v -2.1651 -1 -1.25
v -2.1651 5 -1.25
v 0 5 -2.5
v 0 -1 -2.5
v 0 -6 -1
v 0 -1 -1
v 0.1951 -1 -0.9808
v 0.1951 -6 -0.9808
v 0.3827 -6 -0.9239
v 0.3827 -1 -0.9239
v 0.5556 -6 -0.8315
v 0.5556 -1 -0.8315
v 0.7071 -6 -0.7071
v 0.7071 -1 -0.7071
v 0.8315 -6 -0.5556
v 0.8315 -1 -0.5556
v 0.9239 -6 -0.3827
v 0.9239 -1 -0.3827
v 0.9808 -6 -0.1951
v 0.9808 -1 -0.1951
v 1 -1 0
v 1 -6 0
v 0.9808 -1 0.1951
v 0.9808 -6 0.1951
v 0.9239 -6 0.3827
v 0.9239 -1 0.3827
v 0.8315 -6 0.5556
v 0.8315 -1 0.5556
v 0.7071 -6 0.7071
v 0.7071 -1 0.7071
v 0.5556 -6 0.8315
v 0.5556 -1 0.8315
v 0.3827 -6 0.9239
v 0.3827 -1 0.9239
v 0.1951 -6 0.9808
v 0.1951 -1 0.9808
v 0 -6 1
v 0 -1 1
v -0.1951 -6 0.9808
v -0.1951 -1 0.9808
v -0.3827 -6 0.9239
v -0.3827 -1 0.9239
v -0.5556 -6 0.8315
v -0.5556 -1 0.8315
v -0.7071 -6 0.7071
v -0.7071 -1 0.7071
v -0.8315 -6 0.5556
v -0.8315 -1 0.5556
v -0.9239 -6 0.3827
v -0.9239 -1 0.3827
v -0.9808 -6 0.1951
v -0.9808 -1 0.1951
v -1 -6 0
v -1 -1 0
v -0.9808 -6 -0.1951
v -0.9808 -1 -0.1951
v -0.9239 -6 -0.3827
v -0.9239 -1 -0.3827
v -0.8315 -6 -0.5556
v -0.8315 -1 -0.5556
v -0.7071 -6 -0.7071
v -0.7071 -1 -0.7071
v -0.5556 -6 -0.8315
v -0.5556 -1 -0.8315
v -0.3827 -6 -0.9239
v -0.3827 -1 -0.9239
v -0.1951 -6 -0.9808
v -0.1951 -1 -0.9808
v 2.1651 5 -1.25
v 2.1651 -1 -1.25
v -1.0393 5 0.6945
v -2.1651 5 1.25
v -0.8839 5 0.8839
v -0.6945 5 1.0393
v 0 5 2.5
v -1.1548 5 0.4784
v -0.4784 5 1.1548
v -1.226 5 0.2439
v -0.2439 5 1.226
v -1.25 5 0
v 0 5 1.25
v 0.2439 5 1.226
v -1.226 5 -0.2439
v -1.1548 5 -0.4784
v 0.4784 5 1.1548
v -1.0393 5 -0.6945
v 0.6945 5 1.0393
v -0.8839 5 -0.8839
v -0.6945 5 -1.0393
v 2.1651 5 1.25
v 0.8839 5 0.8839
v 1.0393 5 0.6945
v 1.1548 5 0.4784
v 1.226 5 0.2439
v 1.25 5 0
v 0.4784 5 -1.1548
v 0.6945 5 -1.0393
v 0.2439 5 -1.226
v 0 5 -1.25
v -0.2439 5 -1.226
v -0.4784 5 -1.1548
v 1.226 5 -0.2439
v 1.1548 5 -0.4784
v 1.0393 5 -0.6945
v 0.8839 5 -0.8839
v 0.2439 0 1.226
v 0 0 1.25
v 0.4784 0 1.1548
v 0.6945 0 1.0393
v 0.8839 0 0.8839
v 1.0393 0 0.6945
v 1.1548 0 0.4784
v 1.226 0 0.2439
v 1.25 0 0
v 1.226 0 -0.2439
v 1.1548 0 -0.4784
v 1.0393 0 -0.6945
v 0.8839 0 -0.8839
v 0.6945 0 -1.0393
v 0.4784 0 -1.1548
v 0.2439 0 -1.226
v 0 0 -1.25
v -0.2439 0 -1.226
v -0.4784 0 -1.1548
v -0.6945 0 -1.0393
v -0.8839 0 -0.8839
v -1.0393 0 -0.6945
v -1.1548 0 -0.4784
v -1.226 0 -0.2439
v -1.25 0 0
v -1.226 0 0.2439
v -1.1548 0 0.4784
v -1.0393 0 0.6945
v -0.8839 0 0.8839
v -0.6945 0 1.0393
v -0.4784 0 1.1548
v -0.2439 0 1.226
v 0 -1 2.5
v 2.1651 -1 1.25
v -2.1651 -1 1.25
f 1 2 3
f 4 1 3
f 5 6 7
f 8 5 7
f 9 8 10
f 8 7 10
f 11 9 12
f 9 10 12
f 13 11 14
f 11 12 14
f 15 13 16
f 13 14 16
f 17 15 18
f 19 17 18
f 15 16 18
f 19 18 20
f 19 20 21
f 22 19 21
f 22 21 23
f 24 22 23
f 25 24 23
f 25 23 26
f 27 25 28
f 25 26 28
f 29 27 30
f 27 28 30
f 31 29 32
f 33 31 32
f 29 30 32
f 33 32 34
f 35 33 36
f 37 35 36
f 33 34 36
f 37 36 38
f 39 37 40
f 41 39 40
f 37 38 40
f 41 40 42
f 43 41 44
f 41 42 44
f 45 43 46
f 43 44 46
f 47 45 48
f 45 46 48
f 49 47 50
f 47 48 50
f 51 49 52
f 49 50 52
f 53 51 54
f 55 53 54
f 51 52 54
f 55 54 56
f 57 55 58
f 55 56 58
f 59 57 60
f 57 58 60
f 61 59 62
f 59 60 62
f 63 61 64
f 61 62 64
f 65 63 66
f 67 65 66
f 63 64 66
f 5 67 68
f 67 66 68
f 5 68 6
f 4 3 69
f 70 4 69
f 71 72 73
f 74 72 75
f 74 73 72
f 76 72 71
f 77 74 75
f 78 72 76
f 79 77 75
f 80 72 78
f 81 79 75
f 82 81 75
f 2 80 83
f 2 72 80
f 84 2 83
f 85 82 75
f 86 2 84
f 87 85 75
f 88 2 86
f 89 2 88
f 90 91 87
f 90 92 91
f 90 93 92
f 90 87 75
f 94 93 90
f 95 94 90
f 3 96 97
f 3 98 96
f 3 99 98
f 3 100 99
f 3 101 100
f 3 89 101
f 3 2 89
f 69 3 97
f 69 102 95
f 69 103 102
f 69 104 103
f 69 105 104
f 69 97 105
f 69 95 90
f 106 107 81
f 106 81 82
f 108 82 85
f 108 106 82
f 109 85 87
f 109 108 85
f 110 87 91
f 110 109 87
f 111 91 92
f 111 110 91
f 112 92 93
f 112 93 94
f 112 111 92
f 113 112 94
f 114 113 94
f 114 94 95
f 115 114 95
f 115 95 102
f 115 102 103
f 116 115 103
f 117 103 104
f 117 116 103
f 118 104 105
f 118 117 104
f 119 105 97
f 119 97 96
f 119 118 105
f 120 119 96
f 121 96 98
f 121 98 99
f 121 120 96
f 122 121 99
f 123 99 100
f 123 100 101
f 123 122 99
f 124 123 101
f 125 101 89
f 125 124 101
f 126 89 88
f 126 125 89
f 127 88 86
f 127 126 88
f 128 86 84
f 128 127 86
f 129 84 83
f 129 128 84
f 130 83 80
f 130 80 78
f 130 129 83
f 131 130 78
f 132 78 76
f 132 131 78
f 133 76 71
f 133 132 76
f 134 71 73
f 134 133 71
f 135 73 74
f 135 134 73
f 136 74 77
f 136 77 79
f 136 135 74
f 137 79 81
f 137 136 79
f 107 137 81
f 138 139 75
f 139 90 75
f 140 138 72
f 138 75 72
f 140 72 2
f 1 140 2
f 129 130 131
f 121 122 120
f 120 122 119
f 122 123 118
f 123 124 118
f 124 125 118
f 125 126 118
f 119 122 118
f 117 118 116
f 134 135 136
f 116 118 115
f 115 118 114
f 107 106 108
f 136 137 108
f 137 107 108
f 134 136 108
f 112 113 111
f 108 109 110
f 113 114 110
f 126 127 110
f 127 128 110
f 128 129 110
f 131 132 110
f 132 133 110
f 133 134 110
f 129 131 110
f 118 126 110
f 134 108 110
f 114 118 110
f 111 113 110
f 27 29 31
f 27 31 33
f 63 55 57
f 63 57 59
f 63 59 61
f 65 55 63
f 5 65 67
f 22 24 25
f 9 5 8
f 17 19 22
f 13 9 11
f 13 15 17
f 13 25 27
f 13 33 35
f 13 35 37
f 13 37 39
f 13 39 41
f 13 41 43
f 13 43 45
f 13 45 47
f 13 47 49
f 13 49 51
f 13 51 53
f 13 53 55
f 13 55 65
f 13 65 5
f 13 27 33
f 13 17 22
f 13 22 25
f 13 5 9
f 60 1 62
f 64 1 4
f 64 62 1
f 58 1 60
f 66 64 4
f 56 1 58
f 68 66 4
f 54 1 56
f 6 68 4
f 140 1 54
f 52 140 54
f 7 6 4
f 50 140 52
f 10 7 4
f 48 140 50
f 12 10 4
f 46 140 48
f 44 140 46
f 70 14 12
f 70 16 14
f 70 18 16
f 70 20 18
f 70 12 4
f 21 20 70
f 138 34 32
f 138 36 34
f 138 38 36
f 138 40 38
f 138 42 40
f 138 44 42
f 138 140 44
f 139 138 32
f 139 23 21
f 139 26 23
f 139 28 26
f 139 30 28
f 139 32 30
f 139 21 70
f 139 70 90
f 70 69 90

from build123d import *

# Parameters (mm, degrees)
SKETCH1_R   = 1.25
BODY_DEPTH  = 5
END_DEPTH   = 1
SKETCH3_R   = 1
SCREW_DEPTH = 5


with BuildPart() as part:
    # Sketch1 → Body (new body)
    with BuildSketch(Plane(origin=(0, 0, 0), x_dir=(1, 0, 0), z_dir=(0, 1, 0))):
        Polygon((0, 2.5), (-2.165063509, 1.25), (-2.165063509, -1.25), (0, -2.5), (2.165063509, -1.25), (2.165063509, 1.25), align=None)
        with Locations(Location((0, 0, 0), (0, 0, 270))):
            Circle(SKETCH1_R, mode=Mode.SUBTRACT)
    extrude(amount=BODY_DEPTH)

    # Sketch2 → End (add)
    with BuildSketch(Plane.XZ):
        Polygon((0, -2.5), (2.165063509, -1.25), (2.165063509, 1.25), (0, 2.5), (-2.165063509, 1.25), (-2.165063509, -1.25), align=None)
    extrude(amount=END_DEPTH)

    # Sketch3 → Screw (add)
    with BuildSketch(Plane.XZ.offset(1)):
        with Locations(Location((0, 0, 0), (0, 0, 270))):
            Circle(SKETCH3_R)
    extrude(amount=SCREW_DEPTH)


solid = part.part
